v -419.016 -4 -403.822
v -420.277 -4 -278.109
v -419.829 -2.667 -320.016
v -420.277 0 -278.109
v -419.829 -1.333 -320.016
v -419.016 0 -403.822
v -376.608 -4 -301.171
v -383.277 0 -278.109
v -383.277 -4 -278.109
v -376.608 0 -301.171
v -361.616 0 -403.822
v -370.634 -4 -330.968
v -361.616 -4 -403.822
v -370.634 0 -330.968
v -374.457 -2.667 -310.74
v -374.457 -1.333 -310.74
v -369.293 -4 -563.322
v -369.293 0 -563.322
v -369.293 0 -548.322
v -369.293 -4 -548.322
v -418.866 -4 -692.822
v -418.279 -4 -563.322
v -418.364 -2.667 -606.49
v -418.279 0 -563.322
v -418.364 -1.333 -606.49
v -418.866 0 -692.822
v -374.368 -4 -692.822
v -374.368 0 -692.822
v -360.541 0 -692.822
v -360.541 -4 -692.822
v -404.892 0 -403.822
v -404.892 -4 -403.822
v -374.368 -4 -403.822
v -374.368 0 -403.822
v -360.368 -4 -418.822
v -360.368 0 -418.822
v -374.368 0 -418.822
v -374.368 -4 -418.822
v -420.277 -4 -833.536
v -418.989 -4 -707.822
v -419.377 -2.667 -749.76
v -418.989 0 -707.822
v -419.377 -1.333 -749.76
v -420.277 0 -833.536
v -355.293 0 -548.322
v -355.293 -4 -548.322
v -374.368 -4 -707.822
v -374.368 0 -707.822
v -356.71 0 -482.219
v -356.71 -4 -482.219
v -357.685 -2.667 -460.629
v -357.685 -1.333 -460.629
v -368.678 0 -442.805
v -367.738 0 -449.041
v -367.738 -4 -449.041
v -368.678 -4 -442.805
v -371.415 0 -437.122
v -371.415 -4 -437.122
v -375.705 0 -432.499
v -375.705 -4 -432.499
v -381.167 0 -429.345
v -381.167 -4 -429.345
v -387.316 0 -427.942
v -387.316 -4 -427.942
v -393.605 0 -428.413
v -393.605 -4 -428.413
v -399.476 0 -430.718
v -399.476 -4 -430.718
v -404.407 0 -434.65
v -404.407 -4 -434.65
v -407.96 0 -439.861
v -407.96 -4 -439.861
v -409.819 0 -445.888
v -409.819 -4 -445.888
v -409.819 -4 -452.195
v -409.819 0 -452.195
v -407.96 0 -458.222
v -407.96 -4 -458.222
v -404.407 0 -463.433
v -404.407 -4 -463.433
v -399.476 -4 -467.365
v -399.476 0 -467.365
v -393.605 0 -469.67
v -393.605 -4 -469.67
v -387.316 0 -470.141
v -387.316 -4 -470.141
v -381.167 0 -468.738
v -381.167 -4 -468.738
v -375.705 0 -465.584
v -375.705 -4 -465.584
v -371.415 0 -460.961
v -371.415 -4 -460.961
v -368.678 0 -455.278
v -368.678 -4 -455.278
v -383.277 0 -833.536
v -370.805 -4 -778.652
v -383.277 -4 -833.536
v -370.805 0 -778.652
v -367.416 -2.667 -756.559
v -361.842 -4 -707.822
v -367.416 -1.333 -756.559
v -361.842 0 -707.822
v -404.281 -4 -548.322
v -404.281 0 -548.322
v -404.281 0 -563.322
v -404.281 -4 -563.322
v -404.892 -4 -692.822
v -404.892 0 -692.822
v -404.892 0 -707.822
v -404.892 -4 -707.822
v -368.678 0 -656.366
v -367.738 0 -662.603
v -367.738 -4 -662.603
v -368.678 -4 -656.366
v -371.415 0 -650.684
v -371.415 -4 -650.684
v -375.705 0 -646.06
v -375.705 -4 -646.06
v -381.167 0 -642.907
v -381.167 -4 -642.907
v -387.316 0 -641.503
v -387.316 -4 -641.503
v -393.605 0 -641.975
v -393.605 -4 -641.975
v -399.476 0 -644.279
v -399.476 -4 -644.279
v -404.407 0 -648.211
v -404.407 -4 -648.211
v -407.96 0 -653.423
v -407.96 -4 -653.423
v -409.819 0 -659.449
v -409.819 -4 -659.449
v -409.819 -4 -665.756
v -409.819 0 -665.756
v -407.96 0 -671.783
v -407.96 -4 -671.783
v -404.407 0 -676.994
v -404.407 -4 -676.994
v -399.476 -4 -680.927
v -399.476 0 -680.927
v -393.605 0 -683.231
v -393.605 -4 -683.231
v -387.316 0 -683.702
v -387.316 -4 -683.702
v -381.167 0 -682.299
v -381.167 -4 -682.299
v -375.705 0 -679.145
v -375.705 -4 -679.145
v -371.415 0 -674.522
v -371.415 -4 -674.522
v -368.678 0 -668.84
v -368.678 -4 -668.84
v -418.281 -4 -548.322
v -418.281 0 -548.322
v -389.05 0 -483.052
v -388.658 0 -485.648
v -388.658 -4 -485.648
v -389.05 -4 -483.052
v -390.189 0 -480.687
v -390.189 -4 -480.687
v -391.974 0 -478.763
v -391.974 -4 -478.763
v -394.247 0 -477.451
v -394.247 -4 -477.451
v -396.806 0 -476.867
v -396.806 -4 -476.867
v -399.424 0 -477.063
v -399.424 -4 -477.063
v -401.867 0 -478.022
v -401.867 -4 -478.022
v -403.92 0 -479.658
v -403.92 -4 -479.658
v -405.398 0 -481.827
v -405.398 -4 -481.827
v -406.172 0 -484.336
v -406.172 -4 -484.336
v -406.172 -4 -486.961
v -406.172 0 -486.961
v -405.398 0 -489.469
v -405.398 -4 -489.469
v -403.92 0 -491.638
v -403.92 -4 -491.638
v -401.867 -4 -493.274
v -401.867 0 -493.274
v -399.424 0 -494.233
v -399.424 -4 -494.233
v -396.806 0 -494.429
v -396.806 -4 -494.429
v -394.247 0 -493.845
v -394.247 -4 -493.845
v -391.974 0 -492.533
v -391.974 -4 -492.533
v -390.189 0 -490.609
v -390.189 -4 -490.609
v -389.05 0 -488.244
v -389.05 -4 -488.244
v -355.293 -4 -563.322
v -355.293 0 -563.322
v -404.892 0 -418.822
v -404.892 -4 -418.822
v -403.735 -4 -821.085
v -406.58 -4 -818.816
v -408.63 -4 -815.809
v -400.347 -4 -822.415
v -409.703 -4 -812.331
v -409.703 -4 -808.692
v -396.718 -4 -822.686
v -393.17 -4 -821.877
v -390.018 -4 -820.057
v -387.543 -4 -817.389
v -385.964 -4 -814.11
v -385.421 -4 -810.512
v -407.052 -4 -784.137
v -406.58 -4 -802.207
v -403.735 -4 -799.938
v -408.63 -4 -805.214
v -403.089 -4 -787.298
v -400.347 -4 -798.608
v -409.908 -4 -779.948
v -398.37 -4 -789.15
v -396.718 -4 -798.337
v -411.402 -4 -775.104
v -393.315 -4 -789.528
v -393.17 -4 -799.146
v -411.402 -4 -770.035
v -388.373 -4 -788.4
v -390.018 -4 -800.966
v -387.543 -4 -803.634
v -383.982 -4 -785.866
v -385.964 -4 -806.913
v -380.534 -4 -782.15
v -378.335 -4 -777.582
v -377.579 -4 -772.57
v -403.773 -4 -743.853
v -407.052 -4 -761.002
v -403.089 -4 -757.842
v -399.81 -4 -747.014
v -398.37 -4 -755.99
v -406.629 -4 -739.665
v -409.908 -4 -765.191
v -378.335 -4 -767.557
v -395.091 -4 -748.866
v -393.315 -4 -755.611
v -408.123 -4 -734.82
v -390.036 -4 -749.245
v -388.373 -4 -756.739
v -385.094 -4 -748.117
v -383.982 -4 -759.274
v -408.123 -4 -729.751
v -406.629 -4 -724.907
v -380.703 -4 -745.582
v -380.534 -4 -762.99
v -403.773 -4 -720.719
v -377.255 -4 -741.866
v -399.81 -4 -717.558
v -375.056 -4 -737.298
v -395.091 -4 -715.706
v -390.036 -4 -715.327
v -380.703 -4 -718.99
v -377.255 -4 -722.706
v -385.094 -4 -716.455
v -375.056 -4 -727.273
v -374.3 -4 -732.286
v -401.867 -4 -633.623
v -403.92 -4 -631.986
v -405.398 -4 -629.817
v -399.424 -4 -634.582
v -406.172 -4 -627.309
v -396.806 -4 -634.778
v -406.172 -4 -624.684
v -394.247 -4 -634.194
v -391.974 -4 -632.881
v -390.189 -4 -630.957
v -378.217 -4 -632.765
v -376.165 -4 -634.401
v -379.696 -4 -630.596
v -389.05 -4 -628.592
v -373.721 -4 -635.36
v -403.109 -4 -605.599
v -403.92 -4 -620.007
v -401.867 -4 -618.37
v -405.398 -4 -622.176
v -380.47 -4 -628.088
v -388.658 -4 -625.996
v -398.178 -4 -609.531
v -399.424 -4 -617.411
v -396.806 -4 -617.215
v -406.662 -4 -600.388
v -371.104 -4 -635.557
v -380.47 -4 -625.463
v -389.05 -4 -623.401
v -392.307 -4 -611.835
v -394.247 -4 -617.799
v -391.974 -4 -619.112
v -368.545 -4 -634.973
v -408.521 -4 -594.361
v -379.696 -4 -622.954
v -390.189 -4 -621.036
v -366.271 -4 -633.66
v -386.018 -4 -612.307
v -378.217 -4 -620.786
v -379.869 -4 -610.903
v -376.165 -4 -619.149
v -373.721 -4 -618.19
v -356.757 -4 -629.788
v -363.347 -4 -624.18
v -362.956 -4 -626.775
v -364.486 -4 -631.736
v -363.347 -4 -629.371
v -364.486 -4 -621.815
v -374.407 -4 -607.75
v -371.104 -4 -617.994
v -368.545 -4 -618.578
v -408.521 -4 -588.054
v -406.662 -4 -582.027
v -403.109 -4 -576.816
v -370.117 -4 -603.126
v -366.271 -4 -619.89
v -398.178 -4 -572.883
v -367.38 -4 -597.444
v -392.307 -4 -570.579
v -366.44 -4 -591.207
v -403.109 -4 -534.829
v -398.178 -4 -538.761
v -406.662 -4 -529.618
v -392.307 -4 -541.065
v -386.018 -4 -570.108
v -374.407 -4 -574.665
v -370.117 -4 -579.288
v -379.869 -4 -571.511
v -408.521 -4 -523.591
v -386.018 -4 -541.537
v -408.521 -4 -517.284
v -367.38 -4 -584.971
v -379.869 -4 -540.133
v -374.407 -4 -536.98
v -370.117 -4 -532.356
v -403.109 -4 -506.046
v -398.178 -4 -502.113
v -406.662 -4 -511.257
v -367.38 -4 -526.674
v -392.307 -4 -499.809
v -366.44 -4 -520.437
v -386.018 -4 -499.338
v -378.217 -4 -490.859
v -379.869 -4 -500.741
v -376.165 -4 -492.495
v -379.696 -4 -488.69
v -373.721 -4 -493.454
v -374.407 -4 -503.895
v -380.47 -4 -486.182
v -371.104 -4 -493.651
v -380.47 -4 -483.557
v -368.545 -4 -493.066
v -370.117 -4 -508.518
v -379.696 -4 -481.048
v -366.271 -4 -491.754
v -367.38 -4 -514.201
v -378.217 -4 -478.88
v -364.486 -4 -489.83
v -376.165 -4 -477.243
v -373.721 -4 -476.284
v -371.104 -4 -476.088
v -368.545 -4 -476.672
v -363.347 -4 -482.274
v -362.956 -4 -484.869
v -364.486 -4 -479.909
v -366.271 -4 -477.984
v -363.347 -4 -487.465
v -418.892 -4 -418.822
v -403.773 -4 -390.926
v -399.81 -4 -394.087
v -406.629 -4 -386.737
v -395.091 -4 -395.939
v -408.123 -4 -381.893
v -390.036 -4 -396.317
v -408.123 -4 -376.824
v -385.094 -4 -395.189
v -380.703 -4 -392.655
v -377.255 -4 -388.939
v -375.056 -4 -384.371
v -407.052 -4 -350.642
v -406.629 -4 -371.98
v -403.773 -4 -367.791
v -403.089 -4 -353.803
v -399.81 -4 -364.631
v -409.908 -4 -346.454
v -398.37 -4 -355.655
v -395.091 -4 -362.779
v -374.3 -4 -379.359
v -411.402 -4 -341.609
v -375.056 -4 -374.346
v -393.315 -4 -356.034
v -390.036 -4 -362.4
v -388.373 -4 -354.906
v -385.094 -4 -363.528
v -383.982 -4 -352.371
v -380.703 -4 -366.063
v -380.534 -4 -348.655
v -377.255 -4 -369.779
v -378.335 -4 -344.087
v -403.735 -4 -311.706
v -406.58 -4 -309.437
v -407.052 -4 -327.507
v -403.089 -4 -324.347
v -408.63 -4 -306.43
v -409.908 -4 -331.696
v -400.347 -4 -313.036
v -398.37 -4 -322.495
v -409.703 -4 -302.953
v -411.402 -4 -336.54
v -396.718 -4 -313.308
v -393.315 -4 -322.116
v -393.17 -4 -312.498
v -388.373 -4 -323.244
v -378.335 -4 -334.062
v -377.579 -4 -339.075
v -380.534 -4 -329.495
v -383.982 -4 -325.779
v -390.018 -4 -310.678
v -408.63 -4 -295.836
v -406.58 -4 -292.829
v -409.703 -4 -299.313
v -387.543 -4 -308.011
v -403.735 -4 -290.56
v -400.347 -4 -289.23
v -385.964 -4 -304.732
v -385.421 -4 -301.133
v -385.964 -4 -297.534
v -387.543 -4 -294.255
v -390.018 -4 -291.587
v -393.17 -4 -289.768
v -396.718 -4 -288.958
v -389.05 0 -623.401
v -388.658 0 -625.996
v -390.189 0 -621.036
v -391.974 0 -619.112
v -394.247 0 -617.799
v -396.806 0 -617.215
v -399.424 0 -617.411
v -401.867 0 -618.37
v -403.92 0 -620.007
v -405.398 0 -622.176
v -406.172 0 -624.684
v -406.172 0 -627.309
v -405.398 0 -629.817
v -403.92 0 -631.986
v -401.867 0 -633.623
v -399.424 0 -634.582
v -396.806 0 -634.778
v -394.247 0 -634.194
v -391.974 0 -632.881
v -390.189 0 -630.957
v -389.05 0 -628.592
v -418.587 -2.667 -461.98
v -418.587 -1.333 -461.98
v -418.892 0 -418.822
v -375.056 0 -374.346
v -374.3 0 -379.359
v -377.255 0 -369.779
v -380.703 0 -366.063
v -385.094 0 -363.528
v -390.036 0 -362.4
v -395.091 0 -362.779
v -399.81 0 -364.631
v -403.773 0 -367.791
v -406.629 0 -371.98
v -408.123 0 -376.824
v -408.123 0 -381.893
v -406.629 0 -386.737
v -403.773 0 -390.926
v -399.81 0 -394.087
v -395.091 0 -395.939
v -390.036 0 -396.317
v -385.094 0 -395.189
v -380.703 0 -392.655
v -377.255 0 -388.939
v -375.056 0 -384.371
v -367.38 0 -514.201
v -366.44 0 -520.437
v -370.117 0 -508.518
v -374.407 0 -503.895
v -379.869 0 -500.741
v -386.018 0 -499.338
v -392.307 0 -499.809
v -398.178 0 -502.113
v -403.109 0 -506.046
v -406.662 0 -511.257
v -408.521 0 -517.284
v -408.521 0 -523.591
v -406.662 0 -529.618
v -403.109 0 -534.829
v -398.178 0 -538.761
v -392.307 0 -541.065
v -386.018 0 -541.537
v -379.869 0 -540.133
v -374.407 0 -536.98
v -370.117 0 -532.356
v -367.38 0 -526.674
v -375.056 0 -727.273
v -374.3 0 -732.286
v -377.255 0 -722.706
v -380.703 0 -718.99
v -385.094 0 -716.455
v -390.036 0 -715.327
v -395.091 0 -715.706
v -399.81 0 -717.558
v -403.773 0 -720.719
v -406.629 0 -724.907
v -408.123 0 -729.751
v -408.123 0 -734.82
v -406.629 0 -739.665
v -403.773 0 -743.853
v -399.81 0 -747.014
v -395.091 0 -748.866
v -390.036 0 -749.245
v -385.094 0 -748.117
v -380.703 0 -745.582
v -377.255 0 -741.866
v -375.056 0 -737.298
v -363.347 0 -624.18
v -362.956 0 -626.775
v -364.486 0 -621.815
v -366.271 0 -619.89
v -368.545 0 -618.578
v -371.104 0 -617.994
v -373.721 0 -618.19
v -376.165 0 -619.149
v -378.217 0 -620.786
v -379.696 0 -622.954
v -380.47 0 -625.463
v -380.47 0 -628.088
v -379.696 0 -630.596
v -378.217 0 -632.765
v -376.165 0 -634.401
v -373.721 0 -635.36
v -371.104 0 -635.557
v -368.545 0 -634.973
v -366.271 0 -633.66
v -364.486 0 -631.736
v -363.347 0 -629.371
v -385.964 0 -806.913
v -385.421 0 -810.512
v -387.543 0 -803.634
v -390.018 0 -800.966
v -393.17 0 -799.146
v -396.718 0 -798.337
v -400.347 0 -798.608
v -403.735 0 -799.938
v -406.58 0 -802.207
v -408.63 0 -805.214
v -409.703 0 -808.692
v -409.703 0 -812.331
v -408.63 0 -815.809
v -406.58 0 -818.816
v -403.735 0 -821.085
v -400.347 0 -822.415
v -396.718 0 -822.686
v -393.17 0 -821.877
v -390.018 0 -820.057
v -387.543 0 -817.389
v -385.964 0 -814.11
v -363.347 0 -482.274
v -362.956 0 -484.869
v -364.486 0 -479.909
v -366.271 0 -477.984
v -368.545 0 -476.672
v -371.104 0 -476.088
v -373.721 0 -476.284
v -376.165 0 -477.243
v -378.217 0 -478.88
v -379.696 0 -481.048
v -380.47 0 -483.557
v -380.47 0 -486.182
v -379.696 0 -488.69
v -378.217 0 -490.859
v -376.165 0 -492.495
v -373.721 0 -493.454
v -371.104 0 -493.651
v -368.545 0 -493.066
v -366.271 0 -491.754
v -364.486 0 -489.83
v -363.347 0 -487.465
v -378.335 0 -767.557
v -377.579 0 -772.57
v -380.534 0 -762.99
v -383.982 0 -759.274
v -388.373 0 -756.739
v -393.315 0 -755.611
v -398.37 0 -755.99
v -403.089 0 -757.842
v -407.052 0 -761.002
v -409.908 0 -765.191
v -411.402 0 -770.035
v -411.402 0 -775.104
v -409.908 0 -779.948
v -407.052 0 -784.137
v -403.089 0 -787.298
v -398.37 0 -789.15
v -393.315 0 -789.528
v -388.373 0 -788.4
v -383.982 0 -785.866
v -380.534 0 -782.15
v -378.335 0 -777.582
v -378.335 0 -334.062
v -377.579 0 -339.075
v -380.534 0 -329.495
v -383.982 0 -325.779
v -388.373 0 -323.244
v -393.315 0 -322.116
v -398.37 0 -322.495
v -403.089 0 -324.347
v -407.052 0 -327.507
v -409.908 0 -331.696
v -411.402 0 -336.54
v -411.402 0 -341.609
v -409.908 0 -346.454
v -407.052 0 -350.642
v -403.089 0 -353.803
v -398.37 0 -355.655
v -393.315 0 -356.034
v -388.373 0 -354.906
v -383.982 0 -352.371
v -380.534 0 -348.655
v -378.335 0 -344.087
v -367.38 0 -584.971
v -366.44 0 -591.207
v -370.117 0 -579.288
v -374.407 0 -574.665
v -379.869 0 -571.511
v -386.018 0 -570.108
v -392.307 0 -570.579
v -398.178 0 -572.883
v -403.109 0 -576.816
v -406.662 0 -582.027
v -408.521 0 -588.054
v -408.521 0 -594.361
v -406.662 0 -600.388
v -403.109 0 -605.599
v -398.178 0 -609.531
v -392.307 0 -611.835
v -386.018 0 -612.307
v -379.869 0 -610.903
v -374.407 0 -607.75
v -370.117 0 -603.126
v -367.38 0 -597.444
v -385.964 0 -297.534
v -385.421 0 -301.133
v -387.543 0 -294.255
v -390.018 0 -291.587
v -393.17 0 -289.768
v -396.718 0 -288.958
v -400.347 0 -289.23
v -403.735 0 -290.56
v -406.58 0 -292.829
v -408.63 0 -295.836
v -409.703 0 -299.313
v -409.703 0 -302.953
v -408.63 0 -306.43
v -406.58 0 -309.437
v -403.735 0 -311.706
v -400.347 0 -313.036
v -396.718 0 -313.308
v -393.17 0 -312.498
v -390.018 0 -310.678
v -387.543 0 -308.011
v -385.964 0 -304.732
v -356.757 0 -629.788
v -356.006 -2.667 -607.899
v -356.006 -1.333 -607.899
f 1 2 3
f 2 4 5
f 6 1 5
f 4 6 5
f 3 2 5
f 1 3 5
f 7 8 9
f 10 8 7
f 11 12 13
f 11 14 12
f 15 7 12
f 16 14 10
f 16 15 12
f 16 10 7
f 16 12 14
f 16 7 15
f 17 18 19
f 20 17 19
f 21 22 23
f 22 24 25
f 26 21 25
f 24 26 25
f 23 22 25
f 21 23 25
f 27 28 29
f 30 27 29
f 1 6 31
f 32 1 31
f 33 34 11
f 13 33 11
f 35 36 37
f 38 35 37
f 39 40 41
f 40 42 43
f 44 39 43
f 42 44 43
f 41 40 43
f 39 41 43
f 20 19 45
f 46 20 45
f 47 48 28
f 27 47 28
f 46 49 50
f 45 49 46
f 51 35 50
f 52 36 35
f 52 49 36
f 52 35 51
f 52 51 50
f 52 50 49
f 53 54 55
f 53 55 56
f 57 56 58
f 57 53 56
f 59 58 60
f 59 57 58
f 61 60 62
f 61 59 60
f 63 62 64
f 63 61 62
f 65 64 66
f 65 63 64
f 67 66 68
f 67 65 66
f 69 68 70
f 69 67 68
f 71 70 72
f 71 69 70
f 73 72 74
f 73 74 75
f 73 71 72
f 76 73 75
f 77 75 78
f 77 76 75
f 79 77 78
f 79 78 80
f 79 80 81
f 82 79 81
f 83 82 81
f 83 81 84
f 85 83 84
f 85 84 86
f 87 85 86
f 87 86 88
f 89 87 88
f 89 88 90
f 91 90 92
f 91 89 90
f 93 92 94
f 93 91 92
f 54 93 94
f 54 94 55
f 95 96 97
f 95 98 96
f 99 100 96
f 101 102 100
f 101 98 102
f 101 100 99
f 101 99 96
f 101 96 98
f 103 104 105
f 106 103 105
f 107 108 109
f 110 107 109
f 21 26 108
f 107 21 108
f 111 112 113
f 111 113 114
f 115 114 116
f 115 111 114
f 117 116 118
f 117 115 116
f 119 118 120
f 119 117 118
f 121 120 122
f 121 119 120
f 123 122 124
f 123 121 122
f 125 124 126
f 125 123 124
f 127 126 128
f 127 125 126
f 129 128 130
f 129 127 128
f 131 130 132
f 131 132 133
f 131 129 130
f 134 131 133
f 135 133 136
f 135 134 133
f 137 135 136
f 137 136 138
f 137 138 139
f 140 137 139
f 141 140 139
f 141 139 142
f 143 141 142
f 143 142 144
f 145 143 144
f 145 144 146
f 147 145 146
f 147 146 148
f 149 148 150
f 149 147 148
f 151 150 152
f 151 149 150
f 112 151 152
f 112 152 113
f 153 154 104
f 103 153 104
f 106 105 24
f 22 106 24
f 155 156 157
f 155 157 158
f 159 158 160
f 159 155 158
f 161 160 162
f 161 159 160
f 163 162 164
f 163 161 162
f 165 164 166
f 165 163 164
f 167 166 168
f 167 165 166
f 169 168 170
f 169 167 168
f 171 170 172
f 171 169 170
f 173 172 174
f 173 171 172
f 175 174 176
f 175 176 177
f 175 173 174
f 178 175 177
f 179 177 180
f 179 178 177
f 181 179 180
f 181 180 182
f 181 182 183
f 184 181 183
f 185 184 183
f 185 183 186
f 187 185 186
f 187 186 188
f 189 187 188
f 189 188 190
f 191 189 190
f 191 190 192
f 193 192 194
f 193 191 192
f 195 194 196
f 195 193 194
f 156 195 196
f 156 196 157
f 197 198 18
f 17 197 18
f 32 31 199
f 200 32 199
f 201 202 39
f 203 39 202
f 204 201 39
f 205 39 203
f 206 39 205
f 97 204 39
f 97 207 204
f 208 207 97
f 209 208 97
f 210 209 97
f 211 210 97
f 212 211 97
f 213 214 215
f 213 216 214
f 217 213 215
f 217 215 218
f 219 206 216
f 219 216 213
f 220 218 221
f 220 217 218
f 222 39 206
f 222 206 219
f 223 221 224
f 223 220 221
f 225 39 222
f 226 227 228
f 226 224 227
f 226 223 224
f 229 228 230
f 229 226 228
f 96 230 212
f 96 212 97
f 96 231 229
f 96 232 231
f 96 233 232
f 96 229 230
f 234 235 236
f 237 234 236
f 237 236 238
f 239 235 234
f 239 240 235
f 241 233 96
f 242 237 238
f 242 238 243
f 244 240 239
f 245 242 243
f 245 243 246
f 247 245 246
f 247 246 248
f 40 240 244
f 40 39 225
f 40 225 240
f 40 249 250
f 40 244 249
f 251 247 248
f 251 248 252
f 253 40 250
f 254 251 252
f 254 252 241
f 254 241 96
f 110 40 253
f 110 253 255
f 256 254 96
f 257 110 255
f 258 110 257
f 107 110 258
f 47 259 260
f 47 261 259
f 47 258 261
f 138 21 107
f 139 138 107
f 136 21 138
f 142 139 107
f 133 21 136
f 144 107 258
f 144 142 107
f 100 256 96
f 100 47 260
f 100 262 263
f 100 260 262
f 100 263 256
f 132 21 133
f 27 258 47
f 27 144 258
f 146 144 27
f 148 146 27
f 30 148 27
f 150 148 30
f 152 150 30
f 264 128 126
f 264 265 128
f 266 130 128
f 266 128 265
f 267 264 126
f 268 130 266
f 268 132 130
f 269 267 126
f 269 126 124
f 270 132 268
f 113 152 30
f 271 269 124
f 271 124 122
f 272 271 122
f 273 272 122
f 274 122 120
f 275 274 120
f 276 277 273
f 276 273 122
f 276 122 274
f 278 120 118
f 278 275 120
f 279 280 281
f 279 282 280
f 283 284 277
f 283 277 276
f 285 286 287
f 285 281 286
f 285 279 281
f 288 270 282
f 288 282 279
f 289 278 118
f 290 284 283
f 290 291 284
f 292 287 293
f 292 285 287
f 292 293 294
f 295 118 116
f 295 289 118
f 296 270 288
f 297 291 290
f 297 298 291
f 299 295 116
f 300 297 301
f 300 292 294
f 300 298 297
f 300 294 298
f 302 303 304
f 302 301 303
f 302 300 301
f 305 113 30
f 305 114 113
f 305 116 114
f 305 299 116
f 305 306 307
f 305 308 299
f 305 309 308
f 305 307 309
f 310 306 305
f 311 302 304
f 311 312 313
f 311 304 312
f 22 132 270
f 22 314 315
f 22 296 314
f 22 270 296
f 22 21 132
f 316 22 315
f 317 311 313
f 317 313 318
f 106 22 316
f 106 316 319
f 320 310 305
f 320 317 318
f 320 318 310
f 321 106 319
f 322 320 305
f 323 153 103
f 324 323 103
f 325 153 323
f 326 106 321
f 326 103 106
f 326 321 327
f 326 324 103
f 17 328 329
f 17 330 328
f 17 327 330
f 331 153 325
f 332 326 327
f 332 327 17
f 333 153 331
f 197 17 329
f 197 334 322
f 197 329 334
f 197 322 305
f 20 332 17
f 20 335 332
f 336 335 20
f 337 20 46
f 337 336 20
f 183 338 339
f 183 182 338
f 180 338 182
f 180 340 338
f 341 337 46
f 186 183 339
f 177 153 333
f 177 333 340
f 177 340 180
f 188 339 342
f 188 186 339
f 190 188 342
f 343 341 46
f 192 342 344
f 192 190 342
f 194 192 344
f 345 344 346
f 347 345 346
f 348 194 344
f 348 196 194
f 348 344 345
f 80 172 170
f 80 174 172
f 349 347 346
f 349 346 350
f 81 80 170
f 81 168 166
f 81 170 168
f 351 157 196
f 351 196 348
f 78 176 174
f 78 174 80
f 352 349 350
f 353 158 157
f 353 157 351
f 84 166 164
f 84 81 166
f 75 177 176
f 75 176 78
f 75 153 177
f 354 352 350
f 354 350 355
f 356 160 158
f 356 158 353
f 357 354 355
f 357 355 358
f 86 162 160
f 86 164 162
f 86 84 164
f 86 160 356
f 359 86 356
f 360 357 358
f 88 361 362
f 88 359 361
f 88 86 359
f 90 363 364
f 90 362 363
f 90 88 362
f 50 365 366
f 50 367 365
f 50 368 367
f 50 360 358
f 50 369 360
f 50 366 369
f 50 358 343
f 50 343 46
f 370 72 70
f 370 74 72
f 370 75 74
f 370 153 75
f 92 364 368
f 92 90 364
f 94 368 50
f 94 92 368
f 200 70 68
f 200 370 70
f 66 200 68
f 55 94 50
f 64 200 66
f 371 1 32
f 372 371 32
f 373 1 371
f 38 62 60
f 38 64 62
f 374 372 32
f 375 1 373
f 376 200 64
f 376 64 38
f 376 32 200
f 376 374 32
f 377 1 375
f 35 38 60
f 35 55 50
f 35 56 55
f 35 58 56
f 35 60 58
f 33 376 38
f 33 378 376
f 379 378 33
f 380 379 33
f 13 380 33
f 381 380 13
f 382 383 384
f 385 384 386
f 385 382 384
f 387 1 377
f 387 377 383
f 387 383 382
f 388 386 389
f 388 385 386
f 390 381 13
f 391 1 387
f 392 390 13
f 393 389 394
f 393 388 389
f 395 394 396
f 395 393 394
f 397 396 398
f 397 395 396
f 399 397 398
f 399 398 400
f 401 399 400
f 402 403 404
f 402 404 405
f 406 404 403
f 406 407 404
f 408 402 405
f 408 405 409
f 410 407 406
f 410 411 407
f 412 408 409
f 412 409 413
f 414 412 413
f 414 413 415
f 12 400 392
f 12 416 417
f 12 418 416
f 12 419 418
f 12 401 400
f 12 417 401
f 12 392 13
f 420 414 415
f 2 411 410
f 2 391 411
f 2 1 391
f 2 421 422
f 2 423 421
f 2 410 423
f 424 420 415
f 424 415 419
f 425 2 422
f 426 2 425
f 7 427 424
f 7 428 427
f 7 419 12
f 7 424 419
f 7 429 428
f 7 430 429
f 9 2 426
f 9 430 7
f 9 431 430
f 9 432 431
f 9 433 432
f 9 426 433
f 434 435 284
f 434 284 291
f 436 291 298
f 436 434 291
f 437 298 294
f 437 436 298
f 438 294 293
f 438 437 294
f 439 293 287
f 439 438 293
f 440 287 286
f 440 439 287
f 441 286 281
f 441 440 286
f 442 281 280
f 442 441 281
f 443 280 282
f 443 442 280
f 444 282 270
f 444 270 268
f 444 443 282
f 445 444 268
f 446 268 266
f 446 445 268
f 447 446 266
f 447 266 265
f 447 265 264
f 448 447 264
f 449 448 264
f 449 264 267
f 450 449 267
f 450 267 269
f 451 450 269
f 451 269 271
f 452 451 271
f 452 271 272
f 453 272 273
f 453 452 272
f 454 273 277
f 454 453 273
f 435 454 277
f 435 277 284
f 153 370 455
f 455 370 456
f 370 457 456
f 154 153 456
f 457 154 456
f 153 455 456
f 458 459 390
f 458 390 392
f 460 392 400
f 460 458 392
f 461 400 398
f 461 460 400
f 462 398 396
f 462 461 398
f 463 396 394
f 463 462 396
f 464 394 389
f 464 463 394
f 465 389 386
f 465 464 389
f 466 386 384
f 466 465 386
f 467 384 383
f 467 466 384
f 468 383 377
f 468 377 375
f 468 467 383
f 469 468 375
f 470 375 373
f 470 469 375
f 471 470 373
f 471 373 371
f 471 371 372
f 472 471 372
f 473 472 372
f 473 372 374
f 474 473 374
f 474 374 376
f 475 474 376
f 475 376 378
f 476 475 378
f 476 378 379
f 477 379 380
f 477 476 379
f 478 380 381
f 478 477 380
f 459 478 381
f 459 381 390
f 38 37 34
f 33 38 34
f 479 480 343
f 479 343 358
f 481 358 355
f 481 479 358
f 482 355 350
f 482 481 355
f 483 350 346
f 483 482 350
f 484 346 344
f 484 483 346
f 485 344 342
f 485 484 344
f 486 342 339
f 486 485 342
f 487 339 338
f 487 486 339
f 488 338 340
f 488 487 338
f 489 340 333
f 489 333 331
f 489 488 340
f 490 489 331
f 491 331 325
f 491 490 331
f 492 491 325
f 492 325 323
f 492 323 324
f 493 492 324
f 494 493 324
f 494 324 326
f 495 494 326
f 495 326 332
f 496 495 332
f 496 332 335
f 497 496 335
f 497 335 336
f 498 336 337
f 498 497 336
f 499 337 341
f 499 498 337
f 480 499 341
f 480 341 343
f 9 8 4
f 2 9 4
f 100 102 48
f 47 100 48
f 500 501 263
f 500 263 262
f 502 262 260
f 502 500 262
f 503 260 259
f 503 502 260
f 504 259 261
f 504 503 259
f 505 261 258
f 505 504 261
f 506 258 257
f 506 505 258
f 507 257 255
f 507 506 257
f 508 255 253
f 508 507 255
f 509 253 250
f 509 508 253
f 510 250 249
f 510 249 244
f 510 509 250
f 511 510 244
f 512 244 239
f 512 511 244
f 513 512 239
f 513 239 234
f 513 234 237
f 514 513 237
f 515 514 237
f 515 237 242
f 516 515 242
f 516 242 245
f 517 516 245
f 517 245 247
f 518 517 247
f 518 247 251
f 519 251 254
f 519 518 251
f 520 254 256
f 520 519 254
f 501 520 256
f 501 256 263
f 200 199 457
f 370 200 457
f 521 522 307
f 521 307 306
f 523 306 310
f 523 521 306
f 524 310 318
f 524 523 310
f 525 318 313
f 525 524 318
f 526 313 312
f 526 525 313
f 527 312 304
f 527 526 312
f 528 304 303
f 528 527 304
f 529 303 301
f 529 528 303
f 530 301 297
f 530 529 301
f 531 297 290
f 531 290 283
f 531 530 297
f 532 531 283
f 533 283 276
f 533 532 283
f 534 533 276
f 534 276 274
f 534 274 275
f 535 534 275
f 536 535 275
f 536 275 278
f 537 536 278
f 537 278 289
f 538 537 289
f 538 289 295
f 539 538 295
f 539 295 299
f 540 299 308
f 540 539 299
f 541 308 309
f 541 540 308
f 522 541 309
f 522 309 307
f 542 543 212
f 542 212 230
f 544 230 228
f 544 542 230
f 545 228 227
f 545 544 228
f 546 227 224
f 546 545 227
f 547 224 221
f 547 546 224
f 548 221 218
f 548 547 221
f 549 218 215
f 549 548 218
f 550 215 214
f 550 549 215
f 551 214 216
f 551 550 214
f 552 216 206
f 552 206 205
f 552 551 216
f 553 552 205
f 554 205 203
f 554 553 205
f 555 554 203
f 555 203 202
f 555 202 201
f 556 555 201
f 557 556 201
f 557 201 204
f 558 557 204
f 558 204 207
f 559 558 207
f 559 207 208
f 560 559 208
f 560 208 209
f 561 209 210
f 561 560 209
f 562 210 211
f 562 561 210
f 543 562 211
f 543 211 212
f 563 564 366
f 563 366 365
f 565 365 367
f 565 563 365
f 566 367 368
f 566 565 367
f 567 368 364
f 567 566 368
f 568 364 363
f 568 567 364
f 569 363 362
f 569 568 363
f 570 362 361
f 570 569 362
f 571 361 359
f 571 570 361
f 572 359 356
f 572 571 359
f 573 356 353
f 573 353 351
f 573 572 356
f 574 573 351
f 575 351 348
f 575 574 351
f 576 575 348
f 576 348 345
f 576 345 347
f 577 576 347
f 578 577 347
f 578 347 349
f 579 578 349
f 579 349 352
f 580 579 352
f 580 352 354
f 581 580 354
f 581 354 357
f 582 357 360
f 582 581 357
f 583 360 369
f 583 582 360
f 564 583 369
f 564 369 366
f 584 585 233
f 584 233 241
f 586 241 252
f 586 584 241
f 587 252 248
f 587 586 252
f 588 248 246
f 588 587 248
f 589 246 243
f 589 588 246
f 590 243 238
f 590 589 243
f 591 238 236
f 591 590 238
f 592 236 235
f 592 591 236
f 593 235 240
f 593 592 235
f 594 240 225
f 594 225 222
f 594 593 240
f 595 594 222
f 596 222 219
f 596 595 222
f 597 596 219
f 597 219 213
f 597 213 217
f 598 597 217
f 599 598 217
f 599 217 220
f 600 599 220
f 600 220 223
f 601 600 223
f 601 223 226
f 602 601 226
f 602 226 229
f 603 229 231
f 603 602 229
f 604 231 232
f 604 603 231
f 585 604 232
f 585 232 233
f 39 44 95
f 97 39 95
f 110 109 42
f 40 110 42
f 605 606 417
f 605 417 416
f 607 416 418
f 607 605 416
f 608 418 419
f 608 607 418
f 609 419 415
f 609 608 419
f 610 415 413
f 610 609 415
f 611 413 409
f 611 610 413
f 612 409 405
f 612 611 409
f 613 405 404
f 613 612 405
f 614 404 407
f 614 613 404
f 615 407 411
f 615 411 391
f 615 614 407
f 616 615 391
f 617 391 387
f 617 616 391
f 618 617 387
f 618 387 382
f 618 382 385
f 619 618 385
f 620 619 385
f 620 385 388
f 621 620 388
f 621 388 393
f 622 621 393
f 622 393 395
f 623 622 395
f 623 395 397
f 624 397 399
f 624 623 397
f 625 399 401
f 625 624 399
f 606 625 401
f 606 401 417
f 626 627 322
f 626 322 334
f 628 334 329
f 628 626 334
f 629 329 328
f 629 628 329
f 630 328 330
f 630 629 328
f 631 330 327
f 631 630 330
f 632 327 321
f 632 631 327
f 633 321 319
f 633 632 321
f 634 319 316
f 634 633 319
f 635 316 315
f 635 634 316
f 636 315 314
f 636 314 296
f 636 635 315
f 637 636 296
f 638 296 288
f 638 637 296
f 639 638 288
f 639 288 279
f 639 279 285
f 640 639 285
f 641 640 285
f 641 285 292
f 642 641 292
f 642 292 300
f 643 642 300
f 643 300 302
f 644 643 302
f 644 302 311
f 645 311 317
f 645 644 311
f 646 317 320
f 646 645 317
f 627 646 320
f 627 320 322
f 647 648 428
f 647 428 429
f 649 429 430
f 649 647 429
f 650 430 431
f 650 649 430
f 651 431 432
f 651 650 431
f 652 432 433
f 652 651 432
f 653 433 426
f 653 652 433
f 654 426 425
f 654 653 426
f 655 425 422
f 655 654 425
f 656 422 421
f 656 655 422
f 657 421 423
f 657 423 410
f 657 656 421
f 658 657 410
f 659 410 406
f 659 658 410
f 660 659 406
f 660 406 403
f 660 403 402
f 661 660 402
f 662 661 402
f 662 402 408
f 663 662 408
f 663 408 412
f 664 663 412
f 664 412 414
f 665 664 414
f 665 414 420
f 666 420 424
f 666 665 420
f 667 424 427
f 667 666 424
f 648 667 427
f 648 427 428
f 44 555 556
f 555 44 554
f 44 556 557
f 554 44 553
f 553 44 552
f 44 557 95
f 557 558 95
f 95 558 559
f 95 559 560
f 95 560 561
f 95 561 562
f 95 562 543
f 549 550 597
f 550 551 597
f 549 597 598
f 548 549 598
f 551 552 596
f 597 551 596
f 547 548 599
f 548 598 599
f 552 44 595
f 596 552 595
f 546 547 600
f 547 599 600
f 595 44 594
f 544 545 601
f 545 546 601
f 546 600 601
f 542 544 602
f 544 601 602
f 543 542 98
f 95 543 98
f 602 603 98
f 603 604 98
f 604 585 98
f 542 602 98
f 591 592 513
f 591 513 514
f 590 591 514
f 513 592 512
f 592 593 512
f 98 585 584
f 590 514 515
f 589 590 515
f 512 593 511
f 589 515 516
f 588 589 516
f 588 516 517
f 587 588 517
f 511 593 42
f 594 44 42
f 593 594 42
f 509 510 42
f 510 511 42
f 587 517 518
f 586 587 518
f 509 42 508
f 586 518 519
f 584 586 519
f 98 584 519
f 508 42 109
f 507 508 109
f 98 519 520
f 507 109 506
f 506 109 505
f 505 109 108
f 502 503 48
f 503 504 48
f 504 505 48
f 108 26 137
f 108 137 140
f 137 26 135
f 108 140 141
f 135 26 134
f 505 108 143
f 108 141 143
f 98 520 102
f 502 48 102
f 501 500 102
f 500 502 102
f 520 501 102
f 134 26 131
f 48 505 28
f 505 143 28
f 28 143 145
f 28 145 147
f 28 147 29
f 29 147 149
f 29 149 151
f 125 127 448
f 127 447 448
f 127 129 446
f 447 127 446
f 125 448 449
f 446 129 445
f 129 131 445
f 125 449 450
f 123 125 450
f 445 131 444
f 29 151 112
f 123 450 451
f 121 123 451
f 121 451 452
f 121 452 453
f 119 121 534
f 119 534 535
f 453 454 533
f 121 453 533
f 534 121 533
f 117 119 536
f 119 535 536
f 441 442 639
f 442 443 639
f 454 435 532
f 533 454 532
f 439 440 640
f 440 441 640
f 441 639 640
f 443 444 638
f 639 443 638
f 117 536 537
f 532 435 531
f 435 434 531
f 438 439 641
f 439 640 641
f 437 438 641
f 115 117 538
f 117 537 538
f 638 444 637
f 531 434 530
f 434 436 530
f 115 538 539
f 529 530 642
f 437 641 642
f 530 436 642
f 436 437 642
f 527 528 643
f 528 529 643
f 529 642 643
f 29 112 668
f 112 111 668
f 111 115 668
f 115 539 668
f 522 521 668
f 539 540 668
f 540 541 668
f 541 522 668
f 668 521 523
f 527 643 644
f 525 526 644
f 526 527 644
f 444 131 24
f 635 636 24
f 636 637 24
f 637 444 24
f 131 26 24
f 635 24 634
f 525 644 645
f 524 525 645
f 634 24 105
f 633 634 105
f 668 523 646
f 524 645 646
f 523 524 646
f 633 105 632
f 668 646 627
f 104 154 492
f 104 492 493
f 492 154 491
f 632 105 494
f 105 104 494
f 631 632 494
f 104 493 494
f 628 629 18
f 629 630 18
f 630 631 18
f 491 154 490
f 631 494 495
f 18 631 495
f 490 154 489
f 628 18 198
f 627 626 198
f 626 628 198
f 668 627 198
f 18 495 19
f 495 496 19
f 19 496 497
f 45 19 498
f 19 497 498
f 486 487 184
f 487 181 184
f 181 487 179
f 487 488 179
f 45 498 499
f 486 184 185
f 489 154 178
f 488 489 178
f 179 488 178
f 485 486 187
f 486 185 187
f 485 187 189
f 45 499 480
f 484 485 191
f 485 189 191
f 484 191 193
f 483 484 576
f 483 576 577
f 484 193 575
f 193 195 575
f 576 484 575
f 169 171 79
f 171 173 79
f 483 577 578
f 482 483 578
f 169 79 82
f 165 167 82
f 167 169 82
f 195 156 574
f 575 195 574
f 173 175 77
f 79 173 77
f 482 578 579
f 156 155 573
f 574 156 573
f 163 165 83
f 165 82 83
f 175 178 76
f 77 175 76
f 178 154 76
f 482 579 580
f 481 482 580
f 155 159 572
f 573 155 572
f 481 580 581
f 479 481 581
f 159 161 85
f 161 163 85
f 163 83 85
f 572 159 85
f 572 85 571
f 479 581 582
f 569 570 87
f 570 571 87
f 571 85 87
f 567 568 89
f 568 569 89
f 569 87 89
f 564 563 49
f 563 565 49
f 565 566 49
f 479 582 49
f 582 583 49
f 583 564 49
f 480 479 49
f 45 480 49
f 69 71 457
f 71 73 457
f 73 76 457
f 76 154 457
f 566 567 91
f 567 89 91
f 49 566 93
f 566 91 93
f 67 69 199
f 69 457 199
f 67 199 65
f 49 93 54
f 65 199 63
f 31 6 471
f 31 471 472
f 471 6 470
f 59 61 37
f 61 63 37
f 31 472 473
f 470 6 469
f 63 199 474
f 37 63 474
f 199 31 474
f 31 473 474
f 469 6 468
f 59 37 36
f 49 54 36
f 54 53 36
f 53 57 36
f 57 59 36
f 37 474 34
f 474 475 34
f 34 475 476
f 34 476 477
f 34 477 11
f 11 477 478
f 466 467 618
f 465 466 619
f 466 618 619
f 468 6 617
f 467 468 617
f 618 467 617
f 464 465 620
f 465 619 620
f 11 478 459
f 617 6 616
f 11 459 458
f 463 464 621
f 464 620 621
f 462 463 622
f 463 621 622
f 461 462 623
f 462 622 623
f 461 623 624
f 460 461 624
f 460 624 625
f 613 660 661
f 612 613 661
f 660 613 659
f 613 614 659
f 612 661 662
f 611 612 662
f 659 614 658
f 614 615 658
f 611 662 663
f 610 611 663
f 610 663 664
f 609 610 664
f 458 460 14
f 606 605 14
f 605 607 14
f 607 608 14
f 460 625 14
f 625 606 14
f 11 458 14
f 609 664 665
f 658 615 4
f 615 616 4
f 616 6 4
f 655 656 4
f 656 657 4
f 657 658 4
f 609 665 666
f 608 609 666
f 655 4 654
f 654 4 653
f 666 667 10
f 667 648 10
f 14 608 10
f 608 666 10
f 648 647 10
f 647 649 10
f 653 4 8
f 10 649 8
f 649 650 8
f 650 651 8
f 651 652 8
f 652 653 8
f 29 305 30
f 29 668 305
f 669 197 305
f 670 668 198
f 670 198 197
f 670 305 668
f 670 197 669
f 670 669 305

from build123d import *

# Parameters (mm, degrees)
F0_R     = 21.1586469213
F0_R_2   = 8.806010366
F0_R_3   = 12.2091210128
F0_R_4   = 17.006361888
F1_DEPTH = 4


# Not quite as in the source:
# - ends of sketch curves that miss each other by under 0.0002 mm in the source are joined


with BuildPart() as f1:
    # F0 (on Front) → F1 (new body)
    with BuildSketch(Plane.XZ):
        with BuildLine():
            Line((-404.2813370244, -555.8222100041), (-369.2932587578, -555.8222100041))
            Line((-369.2932587578, -555.8222100041), (-369.2932587578, -548.3222100041))
            Line((-369.2932587578, -548.3222100041), (-355.2932587578, -548.3222100041))
            add(Edge.make_bspline(
                [(-360.3678395822, -418.8222100041), (-357.2043853814, -459.4781491099), (-355.4697568796, -504.0564149856), (-355.2932587578, -548.3222100041)],
                knots=[0.2913303101, 0.2913303101, 0.2913303101, 0.2913303101, 0.4888396728, 0.4888396728, 0.4888396728, 0.4888396728], degree=3))
            Line((-360.3678395822, -418.8222100041), (-374.3678395822, -418.8222100041))
            Line((-374.3678395822, -418.8222100041), (-374.3678395822, -411.3222100041))
            Line((-374.3678395822, -411.3222100041), (-404.8922608862, -411.3222100041))
            Line((-404.8922608862, -411.3222100041), (-404.8922608862, -418.8222100041))
            Line((-404.8922608862, -418.8222100041), (-418.8922608862, -418.8222100041))
            add(Edge.make_bspline(
                [(-418.8922608862, -418.8222100041), (-418.5472091576, -461.9778150808), (-418.3109664436, -505.1392537968), (-418.2813370244, -548.3222100041)],
                knots=[0.2533782445, 0.2533782445, 0.2533782445, 0.2533782445, 0.4865039964, 0.4865039964, 0.4865039964, 0.4865039964], degree=3))
            Line((-418.2813370244, -548.3222100041), (-404.2813370244, -548.3222100041))
            Line((-404.2813370244, -548.3222100041), (-404.2813370244, -555.8222100041))
        make_face()
        with Locations((-387.5988423824, -520.4372406006)):
            Circle(F0_R, mode=Mode.SUBTRACT)
        with Locations((-397.4644243717, -485.6480360031)):
            Circle(F0_R_2, mode=Mode.SUBTRACT)
        with Locations((-371.7619478703, -484.8691523075)):
            Circle(F0_R_2, mode=Mode.SUBTRACT)
        with Locations((-388.8969421387, -449.0414857864)):
            Circle(F0_R, mode=Mode.SUBTRACT)
        with BuildLine():
            Line((-369.2932587578, -563.3222100041), (-369.2932587578, -555.8222100041))
            Line((-369.2932587578, -555.8222100041), (-404.2813370244, -555.8222100041))
            Line((-404.2813370244, -555.8222100041), (-404.2813370244, -563.3222100041))
            Line((-404.2813370244, -563.3222100041), (-418.2794696915, -563.3222100041))
            add(Edge.make_bspline(
                [(-418.2794696915, -563.3222100041), (-418.2983515169, -606.4848543261), (-418.524010714, -649.6671773036), (-418.8658189061, -692.8222100041)],
                knots=[0.5134952141, 0.5134952141, 0.5134952141, 0.5134952141, 0.746484428, 0.746484428, 0.746484428, 0.746484428], degree=3))
            Line((-418.8658189061, -692.8222100041), (-404.8922608862, -692.8222100041))
            Line((-404.8922608862, -692.8222100041), (-404.8922608862, -700.3222100041))
            Line((-404.8922608862, -700.3222100041), (-374.3678395822, -700.3222100041))
            Line((-374.3678395822, -700.3222100041), (-374.3678395822, -692.8222100041))
            Line((-374.3678395822, -692.8222100041), (-360.5407278397, -692.8222100041))
            add(Edge.make_bspline(
                [(-355.2933001029, -563.3222098386), (-355.473221284, -608.2616104093), (-357.267833957, -652.4575821746), (-360.5407278397, -692.8222100041)],
                knots=[0.5111757389, 0.5111757389, 0.5111757389, 0.5111757389, 0.7122386539, 0.7122386539, 0.7122386539, 0.7122386539], degree=3))
            Line((-355.2933001029, -563.3222098386), (-369.2932587578, -563.3222100041))
        make_face()
        with Locations((-388.8969421387, -662.6029342218)):
            Circle(F0_R, mode=Mode.SUBTRACT)
        with Locations((-397.4644243717, -625.9963840052)):
            Circle(F0_R_2, mode=Mode.SUBTRACT)
        with Locations((-371.7619478703, -626.7752677008)):
            Circle(F0_R_2, mode=Mode.SUBTRACT)
        with Locations((-387.5988423824, -591.2071794077)):
            Circle(F0_R, mode=Mode.SUBTRACT)
        with BuildLine():
            add(Edge.make_bspline(
                [(-361.8416139057, -707.8222100042), (-366.5966911813, -759.211500512), (-373.8431834552, -803.4077276906), (-383.2773775989, -833.5357473143)],
                knots=[0.7374547732, 0.7374547732, 0.7374547732, 0.7374547732, 1, 1, 1, 1], degree=3))
            Line((-361.8416139057, -707.8222100041), (-374.3678395822, -707.8222100041))
            Line((-374.3678395822, -707.8222100041), (-374.3678395822, -700.3222100041))
            Line((-374.3678395822, -700.3222100041), (-404.8922608862, -700.3222100041))
            Line((-404.8922608862, -700.3222100041), (-404.8922608862, -707.8222100041))
            Line((-404.8922608862, -707.8222100041), (-418.8922608862, -707.8222100041))
            Line((-418.8922608862, -707.8222100041), (-418.9891725019, -707.8222100041))
            add(Edge.make_bspline(
                [(-418.9891725019, -707.8222100041), (-419.3464745558, -749.7720501318), (-419.8036381759, -791.690950422), (-420.2773775989, -833.5357473143)],
                knots=[0.7734809807, 0.7734809807, 0.7734809807, 0.7734809807, 1, 1, 1, 1], degree=3))
            Line((-420.2773775989, -833.5357473143), (-383.2773775989, -833.5357473143))
        make_face()
        with Locations((-397.6303637028, -810.5115026041)):
            Circle(F0_R_3, mode=Mode.SUBTRACT)
        with Locations((-394.5856392384, -772.5696891352)):
            Circle(F0_R_4, mode=Mode.SUBTRACT)
        with Locations((-391.3067281246, -732.2857707544)):
            Circle(F0_R_4, mode=Mode.SUBTRACT)
        with BuildLine():
            Line((-404.8922608862, -411.3222100041), (-374.3678395822, -411.3222100041))
            Line((-374.3678395822, -411.3222100041), (-374.3678395822, -403.8222100041))
            Line((-374.3678395822, -403.8222100041), (-361.6160762359, -403.8222100041))
            add(Edge.make_bspline(
                [(-383.2773775989, -278.108672694), (-373.6927686449, -304.944377163), (-366.3661772603, -350.3256078146), (-361.6160762359, -403.8222100042)],
                knots=[0, 0, 0, 0, 0.2667311371, 0.2667311371, 0.2667311371, 0.2667311371], degree=3))
            Line((-383.2773775989, -278.108672694), (-420.2773775989, -278.108672694))
            add(Edge.make_bspline(
                [(-420.2773775989, -278.108672694), (-419.8248476428, -320.0189708532), (-419.3746825014, -361.9186969271), (-419.0164252465, -403.8222100041)],
                knots=[0, 0, 0, 0, 0.2263679612, 0.2263679612, 0.2263679612, 0.2263679612], degree=3))
            Line((-419.0164252465, -403.8222100041), (-418.8922608862, -403.8222100041))
            Line((-418.8922608862, -403.8222100041), (-404.8922608862, -403.8222100041))
            Line((-404.8922608862, -403.8222100041), (-404.8922608862, -411.3222100041))
        make_face()
        with Locations((-391.3067281246, -379.3586492538)):
            Circle(F0_R_4, mode=Mode.SUBTRACT)
        with Locations((-394.5856392384, -339.0747308731)):
            Circle(F0_R_4, mode=Mode.SUBTRACT)
        with Locations((-397.6303637028, -301.1329174042)):
            Circle(F0_R_3, mode=Mode.SUBTRACT)
    extrude(amount=F1_DEPTH)


solid = f1.part
